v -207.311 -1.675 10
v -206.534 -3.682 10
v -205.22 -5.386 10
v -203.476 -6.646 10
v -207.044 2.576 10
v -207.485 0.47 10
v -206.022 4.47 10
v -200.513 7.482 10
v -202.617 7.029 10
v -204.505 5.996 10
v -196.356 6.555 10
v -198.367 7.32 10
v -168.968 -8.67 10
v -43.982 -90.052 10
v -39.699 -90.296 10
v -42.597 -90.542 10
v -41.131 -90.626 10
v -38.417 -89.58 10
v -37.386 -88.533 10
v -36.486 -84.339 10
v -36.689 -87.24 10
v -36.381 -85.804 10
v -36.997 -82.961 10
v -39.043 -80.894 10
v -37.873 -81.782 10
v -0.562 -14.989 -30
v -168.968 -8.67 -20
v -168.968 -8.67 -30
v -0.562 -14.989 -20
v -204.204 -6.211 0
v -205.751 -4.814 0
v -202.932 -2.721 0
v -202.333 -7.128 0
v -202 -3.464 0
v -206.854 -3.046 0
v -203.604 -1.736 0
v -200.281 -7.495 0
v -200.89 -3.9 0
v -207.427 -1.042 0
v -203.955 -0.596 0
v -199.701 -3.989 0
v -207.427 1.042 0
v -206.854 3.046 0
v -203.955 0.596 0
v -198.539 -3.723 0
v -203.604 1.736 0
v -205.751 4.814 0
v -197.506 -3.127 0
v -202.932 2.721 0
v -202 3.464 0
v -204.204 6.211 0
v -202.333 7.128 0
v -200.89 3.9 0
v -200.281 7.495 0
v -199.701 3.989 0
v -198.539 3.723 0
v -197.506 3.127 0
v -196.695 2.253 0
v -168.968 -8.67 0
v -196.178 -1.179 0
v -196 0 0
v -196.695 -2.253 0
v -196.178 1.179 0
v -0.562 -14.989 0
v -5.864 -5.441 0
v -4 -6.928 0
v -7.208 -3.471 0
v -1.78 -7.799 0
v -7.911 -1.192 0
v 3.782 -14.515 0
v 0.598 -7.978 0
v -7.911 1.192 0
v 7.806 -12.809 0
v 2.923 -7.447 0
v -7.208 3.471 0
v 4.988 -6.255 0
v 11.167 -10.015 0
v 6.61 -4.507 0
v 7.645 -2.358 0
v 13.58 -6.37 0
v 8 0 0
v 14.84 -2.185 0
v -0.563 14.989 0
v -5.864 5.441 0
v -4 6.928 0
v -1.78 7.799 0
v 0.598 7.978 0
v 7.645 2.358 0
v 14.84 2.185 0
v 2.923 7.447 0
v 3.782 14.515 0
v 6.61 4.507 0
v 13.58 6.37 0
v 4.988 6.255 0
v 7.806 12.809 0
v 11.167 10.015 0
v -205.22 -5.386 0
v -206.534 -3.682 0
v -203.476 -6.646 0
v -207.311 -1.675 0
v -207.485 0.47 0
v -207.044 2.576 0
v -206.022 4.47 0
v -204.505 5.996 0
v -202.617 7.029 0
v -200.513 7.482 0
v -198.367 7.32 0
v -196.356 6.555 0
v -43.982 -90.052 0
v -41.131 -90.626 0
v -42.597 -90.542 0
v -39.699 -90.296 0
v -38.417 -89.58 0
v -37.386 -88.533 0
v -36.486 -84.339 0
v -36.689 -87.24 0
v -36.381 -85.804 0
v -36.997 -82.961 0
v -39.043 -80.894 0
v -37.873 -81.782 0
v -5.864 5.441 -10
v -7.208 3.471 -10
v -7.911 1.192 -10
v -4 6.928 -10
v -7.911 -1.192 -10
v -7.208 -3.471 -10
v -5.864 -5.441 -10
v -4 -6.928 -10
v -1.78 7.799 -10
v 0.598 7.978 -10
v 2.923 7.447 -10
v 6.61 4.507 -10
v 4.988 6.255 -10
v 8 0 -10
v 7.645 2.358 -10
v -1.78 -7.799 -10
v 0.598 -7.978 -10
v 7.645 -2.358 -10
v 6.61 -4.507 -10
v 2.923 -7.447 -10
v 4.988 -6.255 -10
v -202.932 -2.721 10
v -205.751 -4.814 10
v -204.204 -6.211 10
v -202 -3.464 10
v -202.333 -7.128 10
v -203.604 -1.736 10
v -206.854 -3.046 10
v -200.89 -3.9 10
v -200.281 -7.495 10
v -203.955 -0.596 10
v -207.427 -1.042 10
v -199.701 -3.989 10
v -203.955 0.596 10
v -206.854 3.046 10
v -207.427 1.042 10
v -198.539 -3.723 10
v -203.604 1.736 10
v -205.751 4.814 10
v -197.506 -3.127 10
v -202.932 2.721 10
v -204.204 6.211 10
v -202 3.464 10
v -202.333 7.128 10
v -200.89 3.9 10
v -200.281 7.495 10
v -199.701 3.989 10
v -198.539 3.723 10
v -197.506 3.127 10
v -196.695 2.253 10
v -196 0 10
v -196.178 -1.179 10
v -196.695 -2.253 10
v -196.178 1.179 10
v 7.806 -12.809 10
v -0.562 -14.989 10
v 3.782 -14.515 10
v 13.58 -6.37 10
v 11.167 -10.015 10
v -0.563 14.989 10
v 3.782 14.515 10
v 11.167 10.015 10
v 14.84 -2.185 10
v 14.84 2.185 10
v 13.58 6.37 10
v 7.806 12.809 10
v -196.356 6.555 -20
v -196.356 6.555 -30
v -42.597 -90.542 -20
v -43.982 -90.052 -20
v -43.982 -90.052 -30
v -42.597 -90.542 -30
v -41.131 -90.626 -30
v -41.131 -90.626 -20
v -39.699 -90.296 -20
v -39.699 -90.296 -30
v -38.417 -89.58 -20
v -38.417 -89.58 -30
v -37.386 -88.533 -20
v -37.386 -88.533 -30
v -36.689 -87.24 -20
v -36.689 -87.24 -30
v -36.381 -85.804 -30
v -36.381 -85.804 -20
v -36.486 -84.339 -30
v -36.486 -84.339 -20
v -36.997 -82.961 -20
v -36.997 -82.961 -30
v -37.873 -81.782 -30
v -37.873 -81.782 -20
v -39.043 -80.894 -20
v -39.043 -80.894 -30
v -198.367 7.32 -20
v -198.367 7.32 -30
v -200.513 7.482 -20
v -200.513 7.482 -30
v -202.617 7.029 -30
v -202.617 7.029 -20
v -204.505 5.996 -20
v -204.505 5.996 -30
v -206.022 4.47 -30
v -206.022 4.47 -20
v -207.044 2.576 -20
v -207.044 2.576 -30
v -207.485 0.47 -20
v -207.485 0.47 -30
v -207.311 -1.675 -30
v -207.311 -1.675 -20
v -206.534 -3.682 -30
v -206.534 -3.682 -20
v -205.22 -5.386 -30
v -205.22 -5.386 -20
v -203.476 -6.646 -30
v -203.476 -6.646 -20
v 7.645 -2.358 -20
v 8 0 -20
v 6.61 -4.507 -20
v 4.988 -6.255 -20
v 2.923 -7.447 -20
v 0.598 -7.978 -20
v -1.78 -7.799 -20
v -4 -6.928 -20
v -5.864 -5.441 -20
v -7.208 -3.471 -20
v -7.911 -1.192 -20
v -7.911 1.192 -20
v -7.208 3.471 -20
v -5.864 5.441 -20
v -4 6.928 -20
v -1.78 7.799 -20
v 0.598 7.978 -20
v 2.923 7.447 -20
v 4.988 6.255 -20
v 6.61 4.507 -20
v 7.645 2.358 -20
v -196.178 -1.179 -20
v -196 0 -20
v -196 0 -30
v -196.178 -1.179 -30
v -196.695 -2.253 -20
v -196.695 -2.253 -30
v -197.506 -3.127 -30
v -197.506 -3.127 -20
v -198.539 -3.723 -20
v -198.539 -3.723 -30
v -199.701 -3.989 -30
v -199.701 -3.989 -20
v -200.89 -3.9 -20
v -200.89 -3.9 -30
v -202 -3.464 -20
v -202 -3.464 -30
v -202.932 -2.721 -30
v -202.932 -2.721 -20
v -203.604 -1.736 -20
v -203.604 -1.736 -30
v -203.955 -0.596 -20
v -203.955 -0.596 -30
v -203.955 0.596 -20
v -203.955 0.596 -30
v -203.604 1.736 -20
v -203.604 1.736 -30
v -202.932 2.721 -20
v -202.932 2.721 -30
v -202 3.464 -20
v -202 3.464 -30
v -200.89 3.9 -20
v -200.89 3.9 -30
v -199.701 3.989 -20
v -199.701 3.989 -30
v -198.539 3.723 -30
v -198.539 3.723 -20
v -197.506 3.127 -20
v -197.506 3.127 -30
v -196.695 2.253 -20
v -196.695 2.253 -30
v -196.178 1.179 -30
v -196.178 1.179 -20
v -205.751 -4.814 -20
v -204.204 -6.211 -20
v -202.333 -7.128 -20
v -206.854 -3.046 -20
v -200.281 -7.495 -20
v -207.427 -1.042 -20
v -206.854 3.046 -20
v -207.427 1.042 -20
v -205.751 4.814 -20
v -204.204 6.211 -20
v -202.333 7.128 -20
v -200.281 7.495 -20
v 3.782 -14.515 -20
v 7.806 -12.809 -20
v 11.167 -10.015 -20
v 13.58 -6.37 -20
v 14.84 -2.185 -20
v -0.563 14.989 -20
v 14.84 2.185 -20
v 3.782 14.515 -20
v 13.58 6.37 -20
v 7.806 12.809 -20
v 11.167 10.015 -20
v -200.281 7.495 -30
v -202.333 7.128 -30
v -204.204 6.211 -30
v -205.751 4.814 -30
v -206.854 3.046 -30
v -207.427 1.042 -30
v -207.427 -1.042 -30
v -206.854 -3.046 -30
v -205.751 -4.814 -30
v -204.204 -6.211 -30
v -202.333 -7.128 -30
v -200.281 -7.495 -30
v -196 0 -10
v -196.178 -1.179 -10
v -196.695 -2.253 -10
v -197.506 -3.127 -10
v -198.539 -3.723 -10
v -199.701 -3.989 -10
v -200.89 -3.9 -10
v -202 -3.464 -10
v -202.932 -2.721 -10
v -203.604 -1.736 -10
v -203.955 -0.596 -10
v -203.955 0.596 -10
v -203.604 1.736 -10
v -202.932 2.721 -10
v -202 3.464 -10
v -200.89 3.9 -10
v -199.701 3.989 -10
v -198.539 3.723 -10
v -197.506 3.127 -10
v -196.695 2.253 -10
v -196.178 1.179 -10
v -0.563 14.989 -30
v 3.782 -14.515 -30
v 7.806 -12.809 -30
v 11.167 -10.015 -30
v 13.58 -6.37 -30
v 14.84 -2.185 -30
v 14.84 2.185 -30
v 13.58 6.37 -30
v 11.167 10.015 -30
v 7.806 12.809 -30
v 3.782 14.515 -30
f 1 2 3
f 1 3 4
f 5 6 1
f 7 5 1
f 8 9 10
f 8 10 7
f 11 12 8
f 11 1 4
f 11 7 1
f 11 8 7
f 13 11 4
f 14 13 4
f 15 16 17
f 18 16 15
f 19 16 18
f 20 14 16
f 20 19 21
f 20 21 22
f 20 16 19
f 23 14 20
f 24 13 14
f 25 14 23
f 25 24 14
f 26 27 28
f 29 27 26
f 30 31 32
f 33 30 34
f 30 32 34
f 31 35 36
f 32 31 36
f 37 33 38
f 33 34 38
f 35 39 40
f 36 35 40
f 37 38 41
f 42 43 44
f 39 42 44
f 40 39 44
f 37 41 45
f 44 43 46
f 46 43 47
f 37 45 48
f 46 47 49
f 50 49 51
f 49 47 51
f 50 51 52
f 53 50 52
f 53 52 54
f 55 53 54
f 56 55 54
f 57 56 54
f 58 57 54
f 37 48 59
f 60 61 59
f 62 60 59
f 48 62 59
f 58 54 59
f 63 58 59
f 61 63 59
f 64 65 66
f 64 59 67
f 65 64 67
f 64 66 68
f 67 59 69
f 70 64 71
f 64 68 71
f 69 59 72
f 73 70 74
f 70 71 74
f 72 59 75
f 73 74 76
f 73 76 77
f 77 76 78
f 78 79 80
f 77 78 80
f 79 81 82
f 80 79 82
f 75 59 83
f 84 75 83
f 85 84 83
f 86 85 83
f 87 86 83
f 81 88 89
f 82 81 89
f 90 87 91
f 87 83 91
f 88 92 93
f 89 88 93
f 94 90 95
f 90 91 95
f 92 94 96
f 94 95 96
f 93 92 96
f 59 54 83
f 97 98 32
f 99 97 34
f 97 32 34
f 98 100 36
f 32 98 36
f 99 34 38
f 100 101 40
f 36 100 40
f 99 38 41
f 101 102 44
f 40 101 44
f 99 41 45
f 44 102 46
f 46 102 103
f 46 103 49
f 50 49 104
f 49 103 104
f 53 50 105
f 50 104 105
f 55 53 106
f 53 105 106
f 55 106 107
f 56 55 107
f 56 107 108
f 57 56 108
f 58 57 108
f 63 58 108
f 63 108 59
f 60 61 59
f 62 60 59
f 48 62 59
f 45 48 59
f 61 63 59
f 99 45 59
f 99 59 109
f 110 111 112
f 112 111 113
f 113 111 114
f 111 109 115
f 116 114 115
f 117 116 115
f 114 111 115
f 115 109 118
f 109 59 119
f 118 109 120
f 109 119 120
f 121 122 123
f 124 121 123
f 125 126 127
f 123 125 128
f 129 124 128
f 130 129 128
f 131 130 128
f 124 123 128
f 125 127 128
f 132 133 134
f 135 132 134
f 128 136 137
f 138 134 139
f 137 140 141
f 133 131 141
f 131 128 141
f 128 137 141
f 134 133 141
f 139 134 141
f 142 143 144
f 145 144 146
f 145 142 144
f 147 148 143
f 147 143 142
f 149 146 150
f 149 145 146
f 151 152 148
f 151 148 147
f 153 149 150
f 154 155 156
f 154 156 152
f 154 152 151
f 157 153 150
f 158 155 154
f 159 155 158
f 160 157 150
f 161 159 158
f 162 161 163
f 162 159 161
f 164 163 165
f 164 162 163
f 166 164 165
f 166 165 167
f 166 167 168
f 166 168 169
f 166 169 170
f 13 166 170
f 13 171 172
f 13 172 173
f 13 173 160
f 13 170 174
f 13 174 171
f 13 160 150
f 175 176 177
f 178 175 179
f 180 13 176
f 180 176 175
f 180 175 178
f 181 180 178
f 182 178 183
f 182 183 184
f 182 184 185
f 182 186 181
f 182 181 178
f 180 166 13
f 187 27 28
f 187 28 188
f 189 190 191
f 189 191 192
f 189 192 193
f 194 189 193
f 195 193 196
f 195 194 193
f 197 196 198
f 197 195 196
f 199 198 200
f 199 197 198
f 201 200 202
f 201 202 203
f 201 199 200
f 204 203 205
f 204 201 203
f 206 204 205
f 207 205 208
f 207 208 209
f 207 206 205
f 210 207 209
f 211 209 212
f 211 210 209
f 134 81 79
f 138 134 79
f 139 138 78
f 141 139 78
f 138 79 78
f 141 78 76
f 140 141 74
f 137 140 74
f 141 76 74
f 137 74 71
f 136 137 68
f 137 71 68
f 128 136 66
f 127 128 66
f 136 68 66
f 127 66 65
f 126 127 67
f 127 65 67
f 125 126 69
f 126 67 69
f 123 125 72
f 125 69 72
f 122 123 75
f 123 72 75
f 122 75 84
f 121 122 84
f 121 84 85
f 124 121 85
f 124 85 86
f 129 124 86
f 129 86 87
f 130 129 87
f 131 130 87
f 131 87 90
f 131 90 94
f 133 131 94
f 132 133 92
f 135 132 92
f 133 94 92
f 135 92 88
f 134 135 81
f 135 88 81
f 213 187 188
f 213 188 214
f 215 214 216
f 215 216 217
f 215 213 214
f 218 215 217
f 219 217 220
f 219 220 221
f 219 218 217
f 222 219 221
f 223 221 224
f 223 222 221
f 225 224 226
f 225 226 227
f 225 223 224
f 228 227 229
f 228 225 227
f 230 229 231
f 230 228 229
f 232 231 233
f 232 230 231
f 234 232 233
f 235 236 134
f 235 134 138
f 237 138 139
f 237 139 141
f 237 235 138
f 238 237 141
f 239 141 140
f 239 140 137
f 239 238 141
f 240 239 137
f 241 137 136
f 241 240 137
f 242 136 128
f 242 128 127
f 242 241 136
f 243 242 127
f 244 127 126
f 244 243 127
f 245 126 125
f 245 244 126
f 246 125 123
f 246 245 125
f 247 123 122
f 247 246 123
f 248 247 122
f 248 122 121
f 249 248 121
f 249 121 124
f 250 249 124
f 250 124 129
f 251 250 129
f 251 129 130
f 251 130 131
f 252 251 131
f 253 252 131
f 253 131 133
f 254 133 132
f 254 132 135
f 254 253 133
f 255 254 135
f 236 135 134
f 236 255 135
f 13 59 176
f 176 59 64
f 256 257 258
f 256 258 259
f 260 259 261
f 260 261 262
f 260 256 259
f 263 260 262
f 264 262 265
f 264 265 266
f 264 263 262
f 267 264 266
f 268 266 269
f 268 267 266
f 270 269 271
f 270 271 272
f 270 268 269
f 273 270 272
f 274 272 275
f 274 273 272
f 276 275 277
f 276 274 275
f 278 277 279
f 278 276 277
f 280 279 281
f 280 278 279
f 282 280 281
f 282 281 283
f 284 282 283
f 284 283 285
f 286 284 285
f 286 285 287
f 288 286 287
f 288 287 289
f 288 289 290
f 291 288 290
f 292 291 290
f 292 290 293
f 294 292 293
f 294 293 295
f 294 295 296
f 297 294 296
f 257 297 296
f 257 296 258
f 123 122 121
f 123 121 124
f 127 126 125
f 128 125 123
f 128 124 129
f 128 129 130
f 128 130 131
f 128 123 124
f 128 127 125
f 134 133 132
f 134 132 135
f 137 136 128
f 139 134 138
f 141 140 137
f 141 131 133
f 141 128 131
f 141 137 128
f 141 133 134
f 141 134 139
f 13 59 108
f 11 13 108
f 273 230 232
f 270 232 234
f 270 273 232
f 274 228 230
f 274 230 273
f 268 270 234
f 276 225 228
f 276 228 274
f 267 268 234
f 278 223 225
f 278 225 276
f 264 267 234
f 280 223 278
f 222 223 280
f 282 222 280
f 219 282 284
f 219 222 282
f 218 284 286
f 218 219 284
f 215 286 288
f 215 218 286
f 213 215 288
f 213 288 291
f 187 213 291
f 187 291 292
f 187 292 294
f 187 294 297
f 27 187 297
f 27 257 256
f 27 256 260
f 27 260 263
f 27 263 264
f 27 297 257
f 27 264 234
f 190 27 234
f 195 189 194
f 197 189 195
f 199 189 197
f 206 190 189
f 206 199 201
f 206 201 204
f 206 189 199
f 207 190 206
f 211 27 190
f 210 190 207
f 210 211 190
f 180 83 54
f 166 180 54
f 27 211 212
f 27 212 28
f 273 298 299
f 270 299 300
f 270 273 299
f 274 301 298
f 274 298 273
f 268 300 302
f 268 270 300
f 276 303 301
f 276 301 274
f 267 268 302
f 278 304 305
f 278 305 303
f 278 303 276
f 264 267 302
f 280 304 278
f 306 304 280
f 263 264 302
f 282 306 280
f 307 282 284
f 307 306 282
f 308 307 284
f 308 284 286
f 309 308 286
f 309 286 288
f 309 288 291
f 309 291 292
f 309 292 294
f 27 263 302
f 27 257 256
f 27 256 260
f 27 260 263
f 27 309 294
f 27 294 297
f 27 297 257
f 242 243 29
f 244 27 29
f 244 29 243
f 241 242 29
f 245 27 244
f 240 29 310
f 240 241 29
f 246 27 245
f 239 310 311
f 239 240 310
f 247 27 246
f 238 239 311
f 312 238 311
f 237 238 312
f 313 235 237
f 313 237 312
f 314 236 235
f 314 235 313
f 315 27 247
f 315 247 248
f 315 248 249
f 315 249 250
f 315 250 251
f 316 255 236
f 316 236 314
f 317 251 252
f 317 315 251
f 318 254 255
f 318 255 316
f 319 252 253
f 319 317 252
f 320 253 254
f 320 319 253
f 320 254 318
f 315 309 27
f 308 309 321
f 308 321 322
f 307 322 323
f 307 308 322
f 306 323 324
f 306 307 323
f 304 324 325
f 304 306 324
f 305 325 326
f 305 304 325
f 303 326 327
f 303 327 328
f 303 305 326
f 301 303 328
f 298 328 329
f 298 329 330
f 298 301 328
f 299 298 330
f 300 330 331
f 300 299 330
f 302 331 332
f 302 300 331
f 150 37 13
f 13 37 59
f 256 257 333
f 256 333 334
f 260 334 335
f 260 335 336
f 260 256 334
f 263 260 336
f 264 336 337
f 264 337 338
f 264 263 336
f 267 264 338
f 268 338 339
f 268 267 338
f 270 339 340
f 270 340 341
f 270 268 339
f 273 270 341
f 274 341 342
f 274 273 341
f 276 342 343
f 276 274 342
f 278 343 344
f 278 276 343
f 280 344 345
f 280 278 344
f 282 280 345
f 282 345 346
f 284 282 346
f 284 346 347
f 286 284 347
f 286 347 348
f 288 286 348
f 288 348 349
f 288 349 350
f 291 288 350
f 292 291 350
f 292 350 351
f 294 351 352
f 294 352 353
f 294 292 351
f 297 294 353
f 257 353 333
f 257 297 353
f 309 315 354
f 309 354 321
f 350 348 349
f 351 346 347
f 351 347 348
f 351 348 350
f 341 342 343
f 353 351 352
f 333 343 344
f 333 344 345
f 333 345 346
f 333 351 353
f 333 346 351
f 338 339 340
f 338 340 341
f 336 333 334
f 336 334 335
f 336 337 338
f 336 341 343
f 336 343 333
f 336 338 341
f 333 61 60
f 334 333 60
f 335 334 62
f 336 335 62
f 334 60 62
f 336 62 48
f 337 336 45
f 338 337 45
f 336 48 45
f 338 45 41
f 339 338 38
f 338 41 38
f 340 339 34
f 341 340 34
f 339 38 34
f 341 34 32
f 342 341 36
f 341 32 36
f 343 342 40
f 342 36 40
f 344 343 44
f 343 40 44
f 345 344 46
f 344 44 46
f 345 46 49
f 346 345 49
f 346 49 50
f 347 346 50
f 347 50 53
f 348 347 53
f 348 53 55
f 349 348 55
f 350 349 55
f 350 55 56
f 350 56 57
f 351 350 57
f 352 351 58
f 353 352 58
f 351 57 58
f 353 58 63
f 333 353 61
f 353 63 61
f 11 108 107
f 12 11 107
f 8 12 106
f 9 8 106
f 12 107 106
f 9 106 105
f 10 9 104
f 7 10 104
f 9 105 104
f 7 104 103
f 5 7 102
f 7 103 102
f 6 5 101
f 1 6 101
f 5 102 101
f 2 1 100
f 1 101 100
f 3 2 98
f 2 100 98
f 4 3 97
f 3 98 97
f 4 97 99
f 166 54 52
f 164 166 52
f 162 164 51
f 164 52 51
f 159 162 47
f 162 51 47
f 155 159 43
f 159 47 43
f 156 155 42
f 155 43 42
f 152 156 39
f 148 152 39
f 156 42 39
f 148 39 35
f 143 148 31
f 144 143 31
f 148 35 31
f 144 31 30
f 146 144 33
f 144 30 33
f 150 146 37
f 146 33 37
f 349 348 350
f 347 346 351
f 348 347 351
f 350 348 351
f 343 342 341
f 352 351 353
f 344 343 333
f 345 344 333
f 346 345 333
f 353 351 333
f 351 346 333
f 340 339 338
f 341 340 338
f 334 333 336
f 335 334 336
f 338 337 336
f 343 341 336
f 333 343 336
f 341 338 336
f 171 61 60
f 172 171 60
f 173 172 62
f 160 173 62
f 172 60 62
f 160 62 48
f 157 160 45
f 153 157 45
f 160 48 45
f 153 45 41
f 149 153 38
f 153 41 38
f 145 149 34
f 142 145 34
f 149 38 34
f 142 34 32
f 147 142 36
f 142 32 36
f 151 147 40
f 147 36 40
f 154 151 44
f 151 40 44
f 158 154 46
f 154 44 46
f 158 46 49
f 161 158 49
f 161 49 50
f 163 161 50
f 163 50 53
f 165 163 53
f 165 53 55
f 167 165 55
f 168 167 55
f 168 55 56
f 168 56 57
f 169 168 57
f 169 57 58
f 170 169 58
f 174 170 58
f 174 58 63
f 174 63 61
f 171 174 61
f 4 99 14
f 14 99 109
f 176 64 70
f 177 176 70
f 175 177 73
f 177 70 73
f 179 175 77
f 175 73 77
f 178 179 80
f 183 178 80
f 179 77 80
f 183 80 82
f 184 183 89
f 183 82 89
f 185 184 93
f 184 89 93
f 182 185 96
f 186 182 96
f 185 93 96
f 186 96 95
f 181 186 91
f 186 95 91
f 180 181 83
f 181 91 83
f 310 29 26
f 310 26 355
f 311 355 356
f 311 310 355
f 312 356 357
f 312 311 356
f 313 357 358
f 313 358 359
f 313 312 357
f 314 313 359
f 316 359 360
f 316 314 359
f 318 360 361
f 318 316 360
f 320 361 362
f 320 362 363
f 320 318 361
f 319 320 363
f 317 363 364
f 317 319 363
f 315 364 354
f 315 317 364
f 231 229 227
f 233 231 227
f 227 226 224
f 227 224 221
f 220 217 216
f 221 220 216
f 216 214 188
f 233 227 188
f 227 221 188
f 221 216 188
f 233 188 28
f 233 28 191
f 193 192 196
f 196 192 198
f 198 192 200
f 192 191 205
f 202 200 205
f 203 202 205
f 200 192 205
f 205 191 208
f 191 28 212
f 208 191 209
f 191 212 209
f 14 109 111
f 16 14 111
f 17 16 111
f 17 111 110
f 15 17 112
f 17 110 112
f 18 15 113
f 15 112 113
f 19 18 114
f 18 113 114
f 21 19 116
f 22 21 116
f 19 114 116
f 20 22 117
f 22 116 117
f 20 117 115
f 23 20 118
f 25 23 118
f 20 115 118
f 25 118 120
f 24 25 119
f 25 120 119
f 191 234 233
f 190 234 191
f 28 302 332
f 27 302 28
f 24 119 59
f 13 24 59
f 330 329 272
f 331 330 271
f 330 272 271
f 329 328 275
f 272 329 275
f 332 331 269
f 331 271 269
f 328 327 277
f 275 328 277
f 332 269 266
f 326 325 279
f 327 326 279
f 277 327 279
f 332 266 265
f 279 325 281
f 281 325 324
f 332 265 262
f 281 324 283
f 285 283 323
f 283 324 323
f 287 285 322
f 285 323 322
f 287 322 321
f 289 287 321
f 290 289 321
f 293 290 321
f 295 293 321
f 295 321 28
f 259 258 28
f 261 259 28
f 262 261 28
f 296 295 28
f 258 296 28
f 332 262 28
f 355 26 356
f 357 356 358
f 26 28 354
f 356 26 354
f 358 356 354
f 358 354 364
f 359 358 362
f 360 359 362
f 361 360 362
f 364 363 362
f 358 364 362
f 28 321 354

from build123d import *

# Parameters (mm, degrees)
SKETCH1_R           = 15
SKETCH1_R_2         = 7.5
BOSS_EXTRUDE1_DEPTH = 10
SKETCH1_3_R         = 7.5
SKETCH1_3_R_2       = 5.203025773
BOSS_EXTRUDE2_DEPTH = 10
SKETCH2_R           = 8
BOSS_EXTRUDE3_DEPTH = 10
SKETCH3_R           = 4
BOSS_EXTRUDE4_DEPTH = 10
SKETCH4_R           = 4
CUT_EXTRUDE1_DEPTH  = 70


with BuildPart() as part:
    # Sketch1 → Boss-Extrude1 (new body)
    with BuildSketch(Plane.XY):
        with BuildLine():
            Line((-0.5625, 14.989449415), (-200.28125, 7.494724707))
            ThreePointArc((-200.28125, 7.494724707), (-198.25423221, 7.293990322), (-196.355985213, 6.555238839))
            Line((-196.355985213, 6.555238839), (-168.967549637, -8.669814997))
            Line((-168.967549637, -8.669814997), (-0.5625, -14.989449415))
            ThreePointArc((-0.5625, -14.989449415), (-15, 0), (-0.5625, 14.989449415))
        make_face()
        Circle(SKETCH1_R)
        with Locations((-200, 0)):
            Circle(SKETCH1_R_2)
        with BuildLine():
            Line((-168.967549637, -8.669814997), (-196.355985213, 6.555238839))
            ThreePointArc((-196.355985213, 6.555238839), (-193.535477168, 3.802623377), (-192.5, 0))
            ThreePointArc((-192.5, 0), (-194.797086153, -5.401822609), (-200.28125, -7.494724707))
            Line((-200.28125, -7.494724707), (-168.967549637, -8.669814997))
        make_face()
    extrude(amount=BOSS_EXTRUDE1_DEPTH)

    # Sketch2 → Boss-Extrude3 (add)
    with BuildSketch(Plane(origin=(0, 0, 0), x_dir=(-1, 0, 0), z_dir=(0, 0, -1))):
        with Locations(Location((0, 0, 0), (0, 0, 180))):
            Circle(SKETCH2_R)
    extrude(amount=BOSS_EXTRUDE3_DEPTH)

    # Sketch4 → Cut-Extrude1 (cut)
    with BuildSketch(Plane(origin=(0, 0, -10), x_dir=(-1, 0, 0), z_dir=(0, 0, -1))):
        with Locations(Location((200, 0, 0), (0, 0, 180))):
            Circle(SKETCH4_R)
    extrude(amount=-CUT_EXTRUDE1_DEPTH, mode=Mode.SUBTRACT)


with BuildPart() as body_2:
    # Sketch1<3> → Boss-Extrude2 (new body)
    with BuildSketch(Plane.XY):
        with BuildLine():
            ThreePointArc((-200.28125, -7.494724707), (-201.925722688, -7.248557934), (-203.475539225, -6.646098637))
            Line((-203.475539225, -6.646098637), (-43.982159648, -90.052248175))
            ThreePointArc((-43.982159648, -90.052248175), (-46.150549785, -82.971855876), (-39.043063246, -80.893994958))
            Line((-39.043063246, -80.893994958), (-168.967549637, -8.669814997))
            Line((-168.967549637, -8.669814997), (-200.28125, -7.494724707))
        make_face()
        with Locations((-200, 0)):
            Circle(SKETCH1_3_R)
        with BuildLine():
            Line((-168.967549637, -8.669814997), (-196.355985213, 6.555238839))
            ThreePointArc((-196.355985213, 6.555238839), (-193.535477168, 3.802623377), (-192.5, 0))
            ThreePointArc((-192.5, 0), (-194.797086153, -5.401822609), (-200.28125, -7.494724707))
            Line((-200.28125, -7.494724707), (-168.967549637, -8.669814997))
        make_face()
        with Locations((-41.571050293, -85.441605175)):
            Circle(SKETCH1_3_R_2)
    extrude(amount=BOSS_EXTRUDE2_DEPTH)

    # Sketch3 → Boss-Extrude4 (add)
    with BuildSketch(Plane(origin=(0, 0, 0), x_dir=(-1, 0, 0), z_dir=(0, 0, -1))):
        with Locations(Location((200, 0, 0), (0, 0, 180))):
            Circle(SKETCH3_R)
    extrude(amount=BOSS_EXTRUDE4_DEPTH)


with BuildPart() as body_3:
    # Mirror1: mirrored copy
    add(body_2.part.mirror(Plane(origin=(0, 0, -10), x_dir=(1, 0, 0), z_dir=(0, 0, -1))))


with BuildPart() as body_4:
    # Mirror1 2: mirrored copy
    add(part.part.mirror(Plane(origin=(0, 0, -10), x_dir=(1, 0, 0), z_dir=(0, 0, -1))))


solid = Compound([part.part, body_2.part, body_3.part, body_4.part])
